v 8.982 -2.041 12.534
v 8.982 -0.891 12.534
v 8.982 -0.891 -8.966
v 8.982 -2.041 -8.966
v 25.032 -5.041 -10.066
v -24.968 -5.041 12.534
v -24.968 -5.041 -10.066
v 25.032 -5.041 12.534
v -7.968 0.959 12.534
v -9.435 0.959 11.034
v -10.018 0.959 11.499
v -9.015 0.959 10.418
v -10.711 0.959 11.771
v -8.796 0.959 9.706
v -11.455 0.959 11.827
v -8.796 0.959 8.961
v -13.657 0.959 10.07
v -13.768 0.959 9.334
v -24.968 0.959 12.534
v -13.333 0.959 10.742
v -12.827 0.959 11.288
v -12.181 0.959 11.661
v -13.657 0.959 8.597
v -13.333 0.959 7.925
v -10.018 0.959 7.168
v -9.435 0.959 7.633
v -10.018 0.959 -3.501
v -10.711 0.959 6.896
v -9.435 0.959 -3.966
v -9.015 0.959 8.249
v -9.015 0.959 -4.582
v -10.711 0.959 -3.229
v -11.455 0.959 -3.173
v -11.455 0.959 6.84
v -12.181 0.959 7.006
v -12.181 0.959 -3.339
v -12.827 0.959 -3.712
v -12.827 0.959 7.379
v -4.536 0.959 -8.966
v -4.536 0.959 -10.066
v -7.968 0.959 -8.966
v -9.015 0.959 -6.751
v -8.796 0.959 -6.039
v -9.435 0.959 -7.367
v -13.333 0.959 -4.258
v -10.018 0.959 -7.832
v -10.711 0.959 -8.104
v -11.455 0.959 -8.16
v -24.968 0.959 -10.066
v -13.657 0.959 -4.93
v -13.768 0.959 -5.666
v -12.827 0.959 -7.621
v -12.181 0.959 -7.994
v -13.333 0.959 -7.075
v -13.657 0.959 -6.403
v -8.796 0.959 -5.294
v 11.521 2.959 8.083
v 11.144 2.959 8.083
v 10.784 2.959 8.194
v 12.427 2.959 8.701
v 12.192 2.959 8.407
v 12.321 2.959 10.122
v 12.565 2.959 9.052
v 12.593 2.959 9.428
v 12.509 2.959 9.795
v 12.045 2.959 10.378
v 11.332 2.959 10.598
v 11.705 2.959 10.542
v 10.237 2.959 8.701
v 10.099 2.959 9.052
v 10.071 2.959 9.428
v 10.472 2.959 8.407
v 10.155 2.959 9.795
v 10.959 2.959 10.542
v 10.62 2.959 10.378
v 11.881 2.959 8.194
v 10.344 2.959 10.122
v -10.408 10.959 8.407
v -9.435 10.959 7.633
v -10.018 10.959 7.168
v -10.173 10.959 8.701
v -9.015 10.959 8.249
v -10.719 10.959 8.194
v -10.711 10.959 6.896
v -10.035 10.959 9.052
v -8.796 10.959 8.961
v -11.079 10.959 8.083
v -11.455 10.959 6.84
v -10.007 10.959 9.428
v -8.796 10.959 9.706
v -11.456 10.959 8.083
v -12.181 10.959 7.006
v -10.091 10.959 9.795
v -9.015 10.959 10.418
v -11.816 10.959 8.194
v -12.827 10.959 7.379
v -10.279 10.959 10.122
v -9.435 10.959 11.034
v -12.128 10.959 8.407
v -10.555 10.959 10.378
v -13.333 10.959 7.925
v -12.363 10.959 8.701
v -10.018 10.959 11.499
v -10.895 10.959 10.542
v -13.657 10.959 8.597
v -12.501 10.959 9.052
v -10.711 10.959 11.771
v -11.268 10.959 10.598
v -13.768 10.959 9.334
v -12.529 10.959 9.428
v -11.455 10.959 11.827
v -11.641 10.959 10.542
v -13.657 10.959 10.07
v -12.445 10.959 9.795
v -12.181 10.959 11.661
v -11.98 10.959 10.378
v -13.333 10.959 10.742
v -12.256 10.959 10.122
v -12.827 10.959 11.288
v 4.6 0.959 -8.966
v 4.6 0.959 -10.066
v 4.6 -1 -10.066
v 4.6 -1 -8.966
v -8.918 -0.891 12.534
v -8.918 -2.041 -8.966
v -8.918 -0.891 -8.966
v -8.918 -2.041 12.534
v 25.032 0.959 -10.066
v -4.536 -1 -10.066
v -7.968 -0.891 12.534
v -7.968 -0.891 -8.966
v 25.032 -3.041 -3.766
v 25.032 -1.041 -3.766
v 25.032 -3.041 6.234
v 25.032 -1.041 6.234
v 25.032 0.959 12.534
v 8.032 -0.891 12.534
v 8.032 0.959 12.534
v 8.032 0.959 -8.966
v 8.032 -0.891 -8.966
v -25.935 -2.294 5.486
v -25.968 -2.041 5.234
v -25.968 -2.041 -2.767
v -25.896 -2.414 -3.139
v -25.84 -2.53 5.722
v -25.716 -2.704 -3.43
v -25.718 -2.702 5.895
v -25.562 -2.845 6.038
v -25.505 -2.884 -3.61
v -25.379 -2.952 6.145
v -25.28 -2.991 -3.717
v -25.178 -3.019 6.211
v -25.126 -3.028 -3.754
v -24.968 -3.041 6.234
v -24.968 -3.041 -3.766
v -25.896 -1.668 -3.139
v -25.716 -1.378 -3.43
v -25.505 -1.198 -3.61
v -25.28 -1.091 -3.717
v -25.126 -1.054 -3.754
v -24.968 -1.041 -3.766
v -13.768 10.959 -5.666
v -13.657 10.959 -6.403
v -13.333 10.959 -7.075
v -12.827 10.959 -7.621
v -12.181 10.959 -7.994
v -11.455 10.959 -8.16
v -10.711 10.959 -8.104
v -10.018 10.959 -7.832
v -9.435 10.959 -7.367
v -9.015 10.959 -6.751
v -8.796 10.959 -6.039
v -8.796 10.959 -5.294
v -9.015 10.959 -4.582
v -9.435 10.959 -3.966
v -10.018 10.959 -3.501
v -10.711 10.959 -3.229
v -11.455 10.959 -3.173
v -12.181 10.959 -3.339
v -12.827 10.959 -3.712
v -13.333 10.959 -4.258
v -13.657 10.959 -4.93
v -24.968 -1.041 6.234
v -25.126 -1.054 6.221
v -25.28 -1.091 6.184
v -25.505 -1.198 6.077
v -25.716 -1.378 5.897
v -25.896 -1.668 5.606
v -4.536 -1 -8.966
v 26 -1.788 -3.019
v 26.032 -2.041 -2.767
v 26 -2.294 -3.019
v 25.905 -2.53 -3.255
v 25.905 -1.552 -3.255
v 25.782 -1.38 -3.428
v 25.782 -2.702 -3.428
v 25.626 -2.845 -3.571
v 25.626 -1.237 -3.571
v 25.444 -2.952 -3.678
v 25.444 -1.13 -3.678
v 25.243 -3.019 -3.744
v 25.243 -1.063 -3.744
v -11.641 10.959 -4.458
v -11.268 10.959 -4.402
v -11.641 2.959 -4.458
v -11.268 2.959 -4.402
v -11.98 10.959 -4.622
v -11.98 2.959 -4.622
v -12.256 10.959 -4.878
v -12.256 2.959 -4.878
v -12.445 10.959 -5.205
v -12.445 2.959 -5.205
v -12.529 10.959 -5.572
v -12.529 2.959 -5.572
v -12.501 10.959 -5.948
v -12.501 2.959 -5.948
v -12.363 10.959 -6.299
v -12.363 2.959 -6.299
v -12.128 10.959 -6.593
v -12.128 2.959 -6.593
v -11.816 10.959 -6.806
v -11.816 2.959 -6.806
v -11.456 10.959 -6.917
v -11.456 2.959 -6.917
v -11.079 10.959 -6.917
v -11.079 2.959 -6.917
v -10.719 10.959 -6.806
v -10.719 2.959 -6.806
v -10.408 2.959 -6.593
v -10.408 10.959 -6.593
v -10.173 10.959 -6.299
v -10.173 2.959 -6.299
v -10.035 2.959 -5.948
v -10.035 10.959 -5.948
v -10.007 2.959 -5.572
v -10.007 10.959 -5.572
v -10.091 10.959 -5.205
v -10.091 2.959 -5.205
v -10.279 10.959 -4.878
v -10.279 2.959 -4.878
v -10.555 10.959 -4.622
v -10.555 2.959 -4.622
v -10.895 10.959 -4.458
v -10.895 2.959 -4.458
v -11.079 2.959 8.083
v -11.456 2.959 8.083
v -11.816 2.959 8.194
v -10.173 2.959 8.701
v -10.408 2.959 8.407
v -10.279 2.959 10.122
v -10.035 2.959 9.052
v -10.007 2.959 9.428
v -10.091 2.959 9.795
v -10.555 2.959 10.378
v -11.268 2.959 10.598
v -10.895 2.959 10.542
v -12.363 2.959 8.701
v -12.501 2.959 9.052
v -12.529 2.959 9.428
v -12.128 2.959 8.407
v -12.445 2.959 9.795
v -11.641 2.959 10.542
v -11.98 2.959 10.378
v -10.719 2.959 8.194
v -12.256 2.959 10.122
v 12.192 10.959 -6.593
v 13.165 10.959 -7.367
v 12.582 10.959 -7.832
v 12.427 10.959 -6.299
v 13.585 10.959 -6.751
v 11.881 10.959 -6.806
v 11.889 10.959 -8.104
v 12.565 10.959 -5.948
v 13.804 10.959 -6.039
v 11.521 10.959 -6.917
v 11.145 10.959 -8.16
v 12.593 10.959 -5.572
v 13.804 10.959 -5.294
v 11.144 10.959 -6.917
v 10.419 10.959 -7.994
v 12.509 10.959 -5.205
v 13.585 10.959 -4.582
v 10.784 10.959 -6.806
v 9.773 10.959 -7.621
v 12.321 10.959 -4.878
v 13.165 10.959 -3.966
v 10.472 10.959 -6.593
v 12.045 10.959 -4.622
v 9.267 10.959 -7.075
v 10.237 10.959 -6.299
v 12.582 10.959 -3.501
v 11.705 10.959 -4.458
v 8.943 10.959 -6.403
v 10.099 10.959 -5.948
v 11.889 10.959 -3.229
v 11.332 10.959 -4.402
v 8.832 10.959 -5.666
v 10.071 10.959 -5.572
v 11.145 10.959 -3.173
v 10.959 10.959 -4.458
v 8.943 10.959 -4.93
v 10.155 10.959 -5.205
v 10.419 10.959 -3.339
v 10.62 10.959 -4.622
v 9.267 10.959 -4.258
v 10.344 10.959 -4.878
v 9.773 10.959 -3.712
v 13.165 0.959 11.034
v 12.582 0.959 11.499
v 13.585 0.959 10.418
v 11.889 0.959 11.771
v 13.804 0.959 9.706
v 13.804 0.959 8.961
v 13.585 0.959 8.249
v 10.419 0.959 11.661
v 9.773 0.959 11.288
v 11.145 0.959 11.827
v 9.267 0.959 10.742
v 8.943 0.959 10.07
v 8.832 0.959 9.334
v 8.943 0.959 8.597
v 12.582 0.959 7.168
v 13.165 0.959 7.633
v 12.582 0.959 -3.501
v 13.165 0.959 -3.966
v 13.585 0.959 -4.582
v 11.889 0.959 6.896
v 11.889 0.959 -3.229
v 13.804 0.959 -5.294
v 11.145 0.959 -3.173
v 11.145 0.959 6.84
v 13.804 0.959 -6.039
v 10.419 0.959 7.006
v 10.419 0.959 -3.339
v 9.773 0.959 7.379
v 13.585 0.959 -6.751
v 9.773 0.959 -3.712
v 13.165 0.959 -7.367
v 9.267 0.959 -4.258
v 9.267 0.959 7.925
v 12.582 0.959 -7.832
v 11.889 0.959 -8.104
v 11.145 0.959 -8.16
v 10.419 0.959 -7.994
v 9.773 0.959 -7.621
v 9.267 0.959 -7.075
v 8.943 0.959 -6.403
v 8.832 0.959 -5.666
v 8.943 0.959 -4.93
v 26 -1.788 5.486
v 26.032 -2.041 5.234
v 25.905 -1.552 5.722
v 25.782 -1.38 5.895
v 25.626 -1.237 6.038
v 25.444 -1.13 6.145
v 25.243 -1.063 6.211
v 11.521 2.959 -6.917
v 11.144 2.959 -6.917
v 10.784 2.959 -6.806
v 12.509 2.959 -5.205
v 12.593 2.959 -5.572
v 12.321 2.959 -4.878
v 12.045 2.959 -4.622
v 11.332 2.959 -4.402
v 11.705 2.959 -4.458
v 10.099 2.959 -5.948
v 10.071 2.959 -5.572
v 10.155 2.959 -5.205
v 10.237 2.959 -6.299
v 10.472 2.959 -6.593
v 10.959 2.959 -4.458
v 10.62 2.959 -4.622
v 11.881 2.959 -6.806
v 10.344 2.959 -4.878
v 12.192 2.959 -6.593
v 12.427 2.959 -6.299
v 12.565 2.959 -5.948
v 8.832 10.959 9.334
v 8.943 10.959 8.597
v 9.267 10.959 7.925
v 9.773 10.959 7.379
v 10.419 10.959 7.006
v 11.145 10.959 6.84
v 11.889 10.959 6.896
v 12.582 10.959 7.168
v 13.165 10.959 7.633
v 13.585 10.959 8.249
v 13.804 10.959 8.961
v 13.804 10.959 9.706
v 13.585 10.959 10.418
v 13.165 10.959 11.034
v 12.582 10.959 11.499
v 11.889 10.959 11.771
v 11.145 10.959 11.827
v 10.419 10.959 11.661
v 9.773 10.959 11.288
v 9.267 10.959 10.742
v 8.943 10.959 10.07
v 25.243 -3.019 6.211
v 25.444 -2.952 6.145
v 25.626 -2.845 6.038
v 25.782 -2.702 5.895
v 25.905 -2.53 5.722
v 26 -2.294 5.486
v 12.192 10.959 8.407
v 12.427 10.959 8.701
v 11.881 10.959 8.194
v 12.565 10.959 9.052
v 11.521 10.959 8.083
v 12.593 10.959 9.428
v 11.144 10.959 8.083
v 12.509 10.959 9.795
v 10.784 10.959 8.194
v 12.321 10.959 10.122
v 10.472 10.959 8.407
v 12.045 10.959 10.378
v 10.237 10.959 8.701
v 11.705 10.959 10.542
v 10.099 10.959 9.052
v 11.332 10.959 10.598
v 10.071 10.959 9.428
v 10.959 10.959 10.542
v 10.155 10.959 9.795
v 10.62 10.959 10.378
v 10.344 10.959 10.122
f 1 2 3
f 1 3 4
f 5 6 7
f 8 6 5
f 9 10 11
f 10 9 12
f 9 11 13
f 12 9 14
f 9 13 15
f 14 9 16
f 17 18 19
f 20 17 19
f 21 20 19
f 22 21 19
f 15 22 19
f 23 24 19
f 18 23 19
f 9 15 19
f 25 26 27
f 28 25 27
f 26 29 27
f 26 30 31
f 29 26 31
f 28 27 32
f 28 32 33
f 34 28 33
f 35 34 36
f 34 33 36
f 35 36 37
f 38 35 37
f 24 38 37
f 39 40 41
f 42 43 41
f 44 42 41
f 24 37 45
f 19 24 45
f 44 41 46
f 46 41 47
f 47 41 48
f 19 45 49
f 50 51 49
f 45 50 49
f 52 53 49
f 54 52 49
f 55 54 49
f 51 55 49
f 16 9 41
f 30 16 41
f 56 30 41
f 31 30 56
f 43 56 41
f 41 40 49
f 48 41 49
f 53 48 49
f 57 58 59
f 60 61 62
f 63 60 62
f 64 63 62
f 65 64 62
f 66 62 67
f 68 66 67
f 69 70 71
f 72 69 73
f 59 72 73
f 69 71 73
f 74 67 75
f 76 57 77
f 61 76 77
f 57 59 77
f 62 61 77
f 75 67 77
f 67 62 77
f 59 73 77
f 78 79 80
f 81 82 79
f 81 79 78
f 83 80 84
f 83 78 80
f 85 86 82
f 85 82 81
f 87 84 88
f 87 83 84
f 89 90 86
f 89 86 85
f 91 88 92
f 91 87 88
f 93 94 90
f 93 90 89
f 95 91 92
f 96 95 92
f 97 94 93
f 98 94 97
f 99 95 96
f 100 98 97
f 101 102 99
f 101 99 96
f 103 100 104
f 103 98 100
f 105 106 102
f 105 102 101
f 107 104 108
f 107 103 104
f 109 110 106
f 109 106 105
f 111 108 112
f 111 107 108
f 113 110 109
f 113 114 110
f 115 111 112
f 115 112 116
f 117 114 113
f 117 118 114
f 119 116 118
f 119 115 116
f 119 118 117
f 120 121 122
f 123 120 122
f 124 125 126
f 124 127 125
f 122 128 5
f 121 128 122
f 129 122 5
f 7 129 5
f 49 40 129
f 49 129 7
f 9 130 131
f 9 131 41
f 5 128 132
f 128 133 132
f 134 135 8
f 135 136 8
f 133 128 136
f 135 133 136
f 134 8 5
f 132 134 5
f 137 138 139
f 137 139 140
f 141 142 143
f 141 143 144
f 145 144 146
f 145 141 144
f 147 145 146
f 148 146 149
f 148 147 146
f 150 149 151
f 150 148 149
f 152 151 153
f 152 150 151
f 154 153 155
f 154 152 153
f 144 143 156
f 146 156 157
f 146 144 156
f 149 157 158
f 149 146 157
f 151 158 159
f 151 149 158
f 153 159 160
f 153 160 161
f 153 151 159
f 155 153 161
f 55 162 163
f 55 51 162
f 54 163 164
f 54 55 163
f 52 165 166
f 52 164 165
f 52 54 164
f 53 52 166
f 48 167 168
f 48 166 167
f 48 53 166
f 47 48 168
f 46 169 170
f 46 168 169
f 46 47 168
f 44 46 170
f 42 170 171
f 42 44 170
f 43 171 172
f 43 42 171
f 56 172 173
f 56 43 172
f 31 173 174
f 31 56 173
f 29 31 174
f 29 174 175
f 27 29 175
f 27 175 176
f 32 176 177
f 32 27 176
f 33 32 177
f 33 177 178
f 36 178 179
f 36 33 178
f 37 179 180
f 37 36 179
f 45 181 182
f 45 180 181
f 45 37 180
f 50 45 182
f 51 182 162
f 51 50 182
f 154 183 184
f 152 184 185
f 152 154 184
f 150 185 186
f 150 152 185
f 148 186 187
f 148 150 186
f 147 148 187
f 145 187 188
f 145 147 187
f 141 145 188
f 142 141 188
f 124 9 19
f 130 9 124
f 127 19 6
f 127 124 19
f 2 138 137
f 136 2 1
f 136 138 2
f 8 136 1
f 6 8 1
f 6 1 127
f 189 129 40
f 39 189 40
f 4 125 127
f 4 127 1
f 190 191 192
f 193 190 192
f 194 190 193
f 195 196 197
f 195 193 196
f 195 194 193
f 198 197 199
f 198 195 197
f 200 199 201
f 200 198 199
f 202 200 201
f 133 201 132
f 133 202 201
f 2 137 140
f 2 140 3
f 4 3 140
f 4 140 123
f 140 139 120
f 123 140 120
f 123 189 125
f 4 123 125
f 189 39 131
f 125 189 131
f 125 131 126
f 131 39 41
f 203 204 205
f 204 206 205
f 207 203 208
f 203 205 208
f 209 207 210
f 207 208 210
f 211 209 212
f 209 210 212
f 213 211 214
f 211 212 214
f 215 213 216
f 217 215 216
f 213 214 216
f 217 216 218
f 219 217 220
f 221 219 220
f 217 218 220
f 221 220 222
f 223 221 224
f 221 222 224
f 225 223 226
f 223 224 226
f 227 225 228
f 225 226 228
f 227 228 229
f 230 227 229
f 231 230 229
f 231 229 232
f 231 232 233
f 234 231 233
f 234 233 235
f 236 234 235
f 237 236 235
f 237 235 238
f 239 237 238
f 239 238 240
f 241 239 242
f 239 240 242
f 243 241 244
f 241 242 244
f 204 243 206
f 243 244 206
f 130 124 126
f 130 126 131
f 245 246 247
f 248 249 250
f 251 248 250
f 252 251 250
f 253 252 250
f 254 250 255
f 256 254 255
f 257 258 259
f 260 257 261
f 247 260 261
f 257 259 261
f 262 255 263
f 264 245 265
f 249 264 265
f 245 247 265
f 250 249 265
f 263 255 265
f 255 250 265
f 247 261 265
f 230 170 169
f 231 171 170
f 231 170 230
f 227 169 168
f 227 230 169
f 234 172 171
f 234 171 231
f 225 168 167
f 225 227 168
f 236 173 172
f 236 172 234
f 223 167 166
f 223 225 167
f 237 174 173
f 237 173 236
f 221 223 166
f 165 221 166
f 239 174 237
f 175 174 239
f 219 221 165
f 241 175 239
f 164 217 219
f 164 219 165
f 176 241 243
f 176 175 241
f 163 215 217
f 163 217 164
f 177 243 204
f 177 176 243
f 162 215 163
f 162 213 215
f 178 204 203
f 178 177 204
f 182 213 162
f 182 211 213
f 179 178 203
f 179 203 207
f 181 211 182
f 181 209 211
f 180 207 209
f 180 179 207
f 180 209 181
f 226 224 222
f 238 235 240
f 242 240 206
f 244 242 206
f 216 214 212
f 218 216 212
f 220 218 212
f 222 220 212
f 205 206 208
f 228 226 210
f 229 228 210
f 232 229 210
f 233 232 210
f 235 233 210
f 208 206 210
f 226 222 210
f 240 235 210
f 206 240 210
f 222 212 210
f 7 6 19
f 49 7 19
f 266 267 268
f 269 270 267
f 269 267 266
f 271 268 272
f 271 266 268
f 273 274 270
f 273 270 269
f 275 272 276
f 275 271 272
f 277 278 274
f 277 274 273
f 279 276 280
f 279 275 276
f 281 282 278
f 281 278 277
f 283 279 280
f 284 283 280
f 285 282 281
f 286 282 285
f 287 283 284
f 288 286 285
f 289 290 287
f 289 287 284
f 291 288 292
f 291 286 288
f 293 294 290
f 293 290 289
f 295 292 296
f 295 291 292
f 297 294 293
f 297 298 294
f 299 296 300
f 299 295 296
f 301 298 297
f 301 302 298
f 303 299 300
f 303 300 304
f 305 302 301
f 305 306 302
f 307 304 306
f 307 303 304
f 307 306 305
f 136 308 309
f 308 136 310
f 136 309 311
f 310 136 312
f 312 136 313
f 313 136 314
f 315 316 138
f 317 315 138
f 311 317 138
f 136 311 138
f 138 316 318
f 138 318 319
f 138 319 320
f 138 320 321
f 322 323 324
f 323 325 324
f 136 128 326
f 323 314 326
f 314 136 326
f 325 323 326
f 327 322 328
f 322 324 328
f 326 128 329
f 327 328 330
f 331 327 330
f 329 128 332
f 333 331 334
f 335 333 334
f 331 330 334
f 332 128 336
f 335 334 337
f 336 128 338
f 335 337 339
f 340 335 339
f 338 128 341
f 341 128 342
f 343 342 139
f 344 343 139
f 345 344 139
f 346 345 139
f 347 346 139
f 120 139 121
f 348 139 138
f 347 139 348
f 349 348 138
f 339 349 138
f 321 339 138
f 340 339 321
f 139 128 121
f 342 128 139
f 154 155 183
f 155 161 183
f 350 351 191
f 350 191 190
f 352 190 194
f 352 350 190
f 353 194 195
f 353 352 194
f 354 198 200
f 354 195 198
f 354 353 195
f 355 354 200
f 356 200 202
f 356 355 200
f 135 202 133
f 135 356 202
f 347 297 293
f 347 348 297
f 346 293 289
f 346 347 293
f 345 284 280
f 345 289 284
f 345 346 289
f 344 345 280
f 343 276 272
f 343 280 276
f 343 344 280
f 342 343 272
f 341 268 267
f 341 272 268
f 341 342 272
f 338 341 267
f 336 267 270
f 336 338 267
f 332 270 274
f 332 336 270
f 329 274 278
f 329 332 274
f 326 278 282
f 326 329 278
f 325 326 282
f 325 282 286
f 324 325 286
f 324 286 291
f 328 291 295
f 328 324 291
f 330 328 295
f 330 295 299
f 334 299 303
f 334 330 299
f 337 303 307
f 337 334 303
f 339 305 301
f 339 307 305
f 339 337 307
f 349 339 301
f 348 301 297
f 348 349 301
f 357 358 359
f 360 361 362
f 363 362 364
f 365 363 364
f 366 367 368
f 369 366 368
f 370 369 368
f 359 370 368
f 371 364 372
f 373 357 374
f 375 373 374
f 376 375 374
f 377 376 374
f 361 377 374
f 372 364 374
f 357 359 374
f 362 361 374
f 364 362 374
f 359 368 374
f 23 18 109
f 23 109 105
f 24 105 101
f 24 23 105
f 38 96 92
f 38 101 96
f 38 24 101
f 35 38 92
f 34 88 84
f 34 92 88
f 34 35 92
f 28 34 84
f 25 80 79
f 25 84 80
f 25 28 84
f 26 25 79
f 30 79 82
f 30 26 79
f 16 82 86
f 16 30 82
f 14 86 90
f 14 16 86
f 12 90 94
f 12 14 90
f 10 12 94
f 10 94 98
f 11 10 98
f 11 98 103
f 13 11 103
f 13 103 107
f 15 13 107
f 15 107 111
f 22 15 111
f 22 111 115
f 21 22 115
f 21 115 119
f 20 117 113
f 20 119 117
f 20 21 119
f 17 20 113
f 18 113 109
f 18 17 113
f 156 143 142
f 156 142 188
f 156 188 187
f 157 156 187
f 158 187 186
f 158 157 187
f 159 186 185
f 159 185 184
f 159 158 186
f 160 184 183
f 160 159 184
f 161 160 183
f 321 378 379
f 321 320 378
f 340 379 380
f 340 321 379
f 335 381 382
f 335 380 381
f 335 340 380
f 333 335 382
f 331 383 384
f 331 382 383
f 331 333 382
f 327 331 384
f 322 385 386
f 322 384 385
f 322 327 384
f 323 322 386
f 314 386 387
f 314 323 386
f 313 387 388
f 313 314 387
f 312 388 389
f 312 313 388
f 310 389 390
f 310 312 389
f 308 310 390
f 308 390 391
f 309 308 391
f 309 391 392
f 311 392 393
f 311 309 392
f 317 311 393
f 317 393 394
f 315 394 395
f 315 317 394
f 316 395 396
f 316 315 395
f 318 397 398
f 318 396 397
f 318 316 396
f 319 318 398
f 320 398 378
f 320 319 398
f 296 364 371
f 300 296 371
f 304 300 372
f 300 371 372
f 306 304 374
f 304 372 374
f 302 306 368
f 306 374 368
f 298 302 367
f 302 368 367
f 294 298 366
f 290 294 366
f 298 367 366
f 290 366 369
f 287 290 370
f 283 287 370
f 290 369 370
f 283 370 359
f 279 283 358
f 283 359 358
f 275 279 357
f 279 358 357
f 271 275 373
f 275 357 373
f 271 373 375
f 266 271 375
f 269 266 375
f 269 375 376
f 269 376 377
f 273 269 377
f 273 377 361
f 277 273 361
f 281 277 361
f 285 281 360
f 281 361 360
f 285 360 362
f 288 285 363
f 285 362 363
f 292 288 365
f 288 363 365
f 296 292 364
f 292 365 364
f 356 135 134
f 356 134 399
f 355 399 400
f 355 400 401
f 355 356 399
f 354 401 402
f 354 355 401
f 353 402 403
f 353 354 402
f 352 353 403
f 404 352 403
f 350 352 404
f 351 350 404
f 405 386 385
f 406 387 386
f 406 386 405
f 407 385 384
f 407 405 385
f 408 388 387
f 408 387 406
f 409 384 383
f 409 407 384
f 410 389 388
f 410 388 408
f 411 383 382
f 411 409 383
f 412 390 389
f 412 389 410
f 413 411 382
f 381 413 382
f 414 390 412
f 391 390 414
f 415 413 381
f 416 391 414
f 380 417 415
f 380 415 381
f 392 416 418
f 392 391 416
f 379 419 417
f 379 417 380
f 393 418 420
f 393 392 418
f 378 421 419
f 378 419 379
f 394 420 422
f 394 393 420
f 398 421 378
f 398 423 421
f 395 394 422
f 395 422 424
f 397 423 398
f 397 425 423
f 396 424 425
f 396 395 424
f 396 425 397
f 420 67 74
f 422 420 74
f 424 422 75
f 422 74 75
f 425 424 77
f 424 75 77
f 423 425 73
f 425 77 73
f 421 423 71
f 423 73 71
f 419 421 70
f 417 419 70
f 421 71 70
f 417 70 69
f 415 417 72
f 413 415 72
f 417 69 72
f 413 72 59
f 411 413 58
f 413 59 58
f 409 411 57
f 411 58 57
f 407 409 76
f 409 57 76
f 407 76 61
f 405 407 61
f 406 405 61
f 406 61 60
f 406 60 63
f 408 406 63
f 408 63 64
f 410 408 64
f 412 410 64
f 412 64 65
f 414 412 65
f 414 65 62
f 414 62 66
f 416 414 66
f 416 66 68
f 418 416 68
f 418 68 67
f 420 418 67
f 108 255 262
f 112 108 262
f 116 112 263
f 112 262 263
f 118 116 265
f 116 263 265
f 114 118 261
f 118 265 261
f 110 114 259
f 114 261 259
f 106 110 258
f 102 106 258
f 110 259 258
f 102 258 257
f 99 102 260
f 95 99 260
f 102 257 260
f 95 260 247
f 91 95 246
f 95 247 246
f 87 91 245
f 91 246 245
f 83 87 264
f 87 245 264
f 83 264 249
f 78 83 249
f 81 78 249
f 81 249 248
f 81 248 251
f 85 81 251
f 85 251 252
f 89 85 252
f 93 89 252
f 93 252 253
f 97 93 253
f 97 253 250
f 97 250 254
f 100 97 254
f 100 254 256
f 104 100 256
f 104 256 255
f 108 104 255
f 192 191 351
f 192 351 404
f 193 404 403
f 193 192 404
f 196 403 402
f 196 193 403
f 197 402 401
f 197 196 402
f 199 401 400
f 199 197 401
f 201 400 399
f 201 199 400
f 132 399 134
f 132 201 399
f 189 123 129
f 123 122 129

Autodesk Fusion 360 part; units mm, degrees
sketch "Sketch6" plane through (0, -2.041, 0) normal (0, -1, 0) x (1, 0, 0)
  arc A0 (-8.8678, -6.7665) -> (-6.8678, -8.7665) centre (-6.8678, -6.7665) ccw
  line L0 (-6.8678, -8.7665) -> (6.9322, -8.7665)
  arc A1 (6.9322, -8.7665) -> (8.9322, -6.7665) centre (6.9322, -6.7665) ccw
  line L1 (8.9322, -6.7665) -> (8.9322, -6.6865)
  line L2 (8.9322, -6.6865) -> (7.6522, -6.6865)
  arc A2 (7.6522, -4.8865) -> (7.6522, -6.6865) centre (7.6522, -5.7865) ccw
  line L3 (7.6522, -4.8865) -> (8.9322, -4.8865)
  line L4 (8.9322, -4.8865) -> (8.9322, -4.1465)
  line L5 (8.9322, -4.1465) -> (7.6522, -4.1465)
  arc A3 (7.6522, -2.3465) -> (7.6522, -4.1465) centre (7.6522, -3.2465) ccw
  line L6 (7.6522, -2.3465) -> (8.9322, -2.3465)
  line L7 (8.9322, -2.3465) -> (8.9322, -1.6065)
  line L8 (8.9322, -1.6065) -> (7.6522, -1.6065)
  arc A4 (7.6522, 0.1935) -> (7.6522, -1.6065) centre (7.6522, -0.7065) ccw
  line L9 (7.6522, 0.1935) -> (8.9322, 0.1935)
  line L10 (8.9322, 0.1935) -> (8.9322, 0.9335)
  line L11 (8.9322, 0.9335) -> (7.6522, 0.9335)
  arc A5 (7.6522, 2.7335) -> (7.6522, 0.9335) centre (7.6522, 1.8335) ccw
  line L12 (7.6522, 2.7335) -> (8.9322, 2.7335)
  line L13 (8.9322, 2.7335) -> (8.9322, 3.4735)
  line L14 (8.9322, 3.4735) -> (7.6522, 3.4735)
  arc A6 (7.6522, 5.2735) -> (7.6522, 3.4735) centre (7.6522, 4.3735) ccw
  line L15 (7.6522, 5.2735) -> (8.9322, 5.2735)
  line L16 (8.9322, 5.2735) -> (8.9322, 6.0135)
  line L17 (8.9322, 6.0135) -> (7.6522, 6.0135)
  arc A7 (7.6522, 7.8135) -> (7.6522, 6.0135) centre (7.6522, 6.9135) ccw
  line L18 (7.6522, 7.8135) -> (8.9322, 7.8135)
  line L19 (8.9322, 7.8135) -> (8.9322, 8.5535)
  line L20 (8.9322, 8.5535) -> (7.6522, 8.5535)
  arc A8 (7.6522, 10.3535) -> (7.6522, 8.5535) centre (7.6522, 9.4535) ccw
  line L21 (7.6522, 10.3535) -> (8.9322, 10.3535)
  line L22 (8.9322, 10.3535) -> (8.9322, 10.4335)
  arc A9 (8.9322, 10.4335) -> (6.9322, 12.4335) centre (6.9322, 10.4335) ccw
  line L23 (6.9322, 12.4335) -> (-6.8678, 12.4335)
  arc A10 (-6.8678, 12.4335) -> (-8.8678, 10.4335) centre (-6.8678, 10.4335) ccw
  line L24 (-8.8678, 10.4335) -> (-8.8678, 10.3535)
  line L25 (-8.8678, 10.3535) -> (-7.5878, 10.3535)
  arc A11 (-7.5878, 8.5535) -> (-7.5878, 10.3535) centre (-7.5878, 9.4535) ccw
  line L26 (-7.5878, 8.5535) -> (-8.8678, 8.5535)
  line L27 (-8.8678, 8.5535) -> (-8.8678, 7.8135)
  line L28 (-8.8678, 7.8135) -> (-7.5878, 7.8135)
  arc A12 (-7.5878, 6.0135) -> (-7.5878, 7.8135) centre (-7.5878, 6.9135) ccw
  line L29 (-7.5878, 6.0135) -> (-8.8678, 6.0135)
  line L30 (-8.8678, 6.0135) -> (-8.8678, 5.2735)
  line L31 (-8.8678, 5.2735) -> (-7.5878, 5.2735)
  arc A13 (-7.5878, 3.4735) -> (-7.5878, 5.2735) centre (-7.5878, 4.3735) ccw
  line L32 (-7.5878, 3.4735) -> (-8.8678, 3.4735)
  line L33 (-8.8678, 3.4735) -> (-8.8678, 2.7335)
  line L34 (-8.8678, 2.7335) -> (-7.5878, 2.7335)
  arc A14 (-7.5878, 0.9335) -> (-7.5878, 2.7335) centre (-7.5878, 1.8335) ccw
  line L35 (-7.5878, 0.9335) -> (-8.8678, 0.9335)
  line L36 (-8.8678, 0.9335) -> (-8.8678, 0.1935)
  line L37 (-8.8678, 0.1935) -> (-7.5878, 0.1935)
  arc A15 (-7.5878, -1.6065) -> (-7.5878, 0.1935) centre (-7.5878, -0.7065) ccw
  line L38 (-7.5878, -1.6065) -> (-8.8678, -1.6065)
  line L39 (-8.8678, -1.6065) -> (-8.8678, -2.3465)
  line L40 (-8.8678, -2.3465) -> (-7.5878, -2.3465)
  arc A16 (-7.5878, -4.1465) -> (-7.5878, -2.3465) centre (-7.5878, -3.2465) ccw
  line L41 (-7.5878, -4.1465) -> (-8.8678, -4.1465)
  line L42 (-8.8678, -4.1465) -> (-8.8678, -4.8865)
  line L43 (-8.8678, -4.8865) -> (-7.5878, -4.8865)
  arc A17 (-7.5878, -6.6865) -> (-7.5878, -4.8865) centre (-7.5878, -5.7865) ccw
  line L44 (-7.5878, -6.6865) -> (-8.8678, -6.6865)
  line L45 (-8.8678, -6.6865) -> (-8.8678, -6.7665)
  line L46 (0.0322, -8.7665) -> (0.0322, 12.4335)
  line L47 (25.0322, 12.5335) -> (-24.9678, 12.5335)
  line L48 (-24.9678, 12.5335) -> (-24.9678, -8.8665)
  line L49 (-24.9678, -8.8665) -> (25.0322, -8.8665)
  line L50 (25.0322, -8.8665) -> (25.0322, 12.5335)
  line L51 (25.0322, 12.5335) -> (-24.9678, -8.8665) construction
  line L52 (-24.9678, 12.5335) -> (25.0322, -8.8665) construction
  point P0 (0.0322, 1.8335)
  point P1 (0.0322, 1.8335)
  dimension "d1" = 50
  dimension "d2" = 21.4
extrude "Extrude1" add sketch "Sketch6" along normal blind 3 contours A0 L0 L23 A10 L24 L25 A11 L26 L27 L28 A12 L29 L30 L31 A13 L32 L33 L34 A14 L35 L36 L37 A15 L38 L39 L40 A16 L41 L42 L43 A17 L44 L45 L46 | L0 A1 L1 L2 A2 L3 L4 L5 A3 L6 L7 L8 A4 L9 L10 L11 A5 L12 L13 L14 A6 L15 L16 L17 A7 L18 L19 L20 A8 L21 L22 A9 L23 L46 | L47 L48 L49 L50 makes body 1
sketch "Sketch7" plane through (0, 0, 12.5335) normal (0, 0, 1) x (1, 0, 0)
  line L0 (25.0322, -2.041) -> (-24.9678, -2.041)
  line L1 (-24.9678, -2.041) -> (-24.9678, -5.041)
  line L2 (-24.9678, -5.041) -> (25.0322, -5.041)
  line L3 (25.0322, -5.041) -> (25.0322, -2.041)
  line L4 (-8.8678, -2.041) -> (8.9323, -2.041)
  line L5 (15.0322, -2.041) -> (15.0322, 0.959)
  line L6 (-14.9678, 0.959) -> (-14.9678, -2.041)
  line L7 (8.9822, -0.891) -> (8.9822, -2.041)
  line L8 (-8.9178, -2.041) -> (-8.9178, -0.891)
  line L9 (15.0322, 0.959) -> (8.0322, 0.959)
  line L10 (-7.9678, 0.959) -> (-14.9678, 0.959)
  line L11 (-8.9178, -0.891) -> (-7.9678, -0.891)
  line L12 (8.0322, -0.891) -> (8.9822, -0.891)
  line L13 (-7.9678, -1.0131) -> (-7.9678, 0.959)
  line L14 (8.0322, 0.959) -> (8.0322, -0.891)
  line L15 (-14.9678, -2.041) -> (15.0322, -2.041)
  point P0 (0.0322, -2.041)
  point P1 (0.0322, -2.041)
  point P2 (0.0322, -2.041)
  dimension "d5" = 17.8001
  dimension "d6" = 30
extrude "Extrude2" add sketch "Sketch7" against normal blind 21.4 contours L0 L5 L7 L9 L12 L14 L15 | L0 L6 L8 L10 L11 L13 L15 bodies 1
extrude "Extrude3" add 1 faces at (15.0322, -1.041, 5.4001) along direction (1, 0, 0) blind 10 on bodies 1 bodies 1
extrude "Extrude4" add 1 faces at (-14.9678, -0.041, 5.4001) along direction (-1, 0, 0) blind 10 on bodies 1 bodies 1
sketch "Sketch8" plane through (0, 0.959, 0) normal (0, 1, 0) x (-1, 0, 0)
  line L0 (-8.0322, 12.5335) -> (-25.0322, 12.5335)
  line L1 (-25.0322, 12.5335) -> (-25.0322, -8.8665)
  line L2 (-25.0322, -8.8665) -> (-8.0322, -8.8665)
  line L3 (-8.0322, -8.8665) -> (-8.0322, 12.5335)
  line L4 (24.9678, 12.5335) -> (24.9678, -8.8665)
  line L5 (-25.0322, 1.8335) -> (24.9678, 1.8335)
  line L6 (-11.3322, 9.3335) -> (11.2678, -5.6665) construction
  line L7 (11.2678, 9.3335) -> (-11.3322, -5.6665) construction
  circle A0 centre (11.2678, -5.6665) radius 2.5
  circle A1 centre (-11.3322, -5.6665) radius 2.5
  circle A2 centre (11.2678, 9.3335) radius 2.5
  circle A3 centre (-11.3322, 9.3335) radius 2.5
  point P0 (30, -14)
  point P1 (24.9678, 1.8335)
  point P2 (-25.0322, 1.8335)
  point P3 (-0.0322, 1.8335)
  point P4 (-0.0322, 1.8335)
  dimension "d17" = 22.6
  dimension "d18" = 15
  dimension "d19" = 5
  dimension "d22" = -22.6
  dimension "d23" = 15
extrude "Extrude5" add sketch "Sketch8" along normal blind 10 contours A0 | A1 | A2 | A3 bodies 1
sketch "Sketch9" plane through (0, 10.959, 0) normal (0, 1, 0) x (-1, 0, 0)
  circle A0 centre (11.2678, -5.6665) radius 2.5
  circle A1 centre (11.2678, -5.6665) radius 2.5
  point P0 (-11.3322, -5.6665)
  point P1 (11.2678, 9.3335)
  point P2 (-11.3322, 9.3335)
  dimension "d28" = -22.6
  dimension "d29" = 15
hole "Hole1" at (-11.2678, 10.959, -5.6665) at (-11.2678, 10.959, 9.3335) at (11.3322, 10.959, 9.3335) at (11.3322, 10.959, -5.6665) direction (0, -1, 0) diameter 2.529 depth 8 tip angle 180 bodies 1
extrude "Extrude6" add 1 faces at (3.0155, -4.041, -8.8665) along direction (0, 0, -1) blind 1.2 on bodies 1 bodies 1
sketch "Sketch10" plane through (0, 0, -10.0665) normal (0, 0, -1) x (-1, 0, 0)
  line L0 (24.9678, -2.041) -> (24.9678, -2.041)
  line L1 (24.9678, -2.041) -> (24.9678, 0.959)
  line L2 (24.9678, 0.959) -> (7.9678, 0.959)
  line L3 (7.9678, 0.959) -> (7.9678, -0.891)
  line L4 (7.9678, -0.891) -> (8.9178, -0.891)
  line L5 (8.9178, -0.891) -> (8.9178, -2.041)
  line L6 (8.9178, -2.041) -> (-8.9822, -2.041)
  line L7 (-8.9822, -2.041) -> (-8.9822, -0.891)
  line L8 (-8.9822, -0.891) -> (-8.0322, -0.891)
  line L9 (-8.0322, -0.891) -> (-8.0322, 0.959)
  line L10 (-8.0322, 0.959) -> (-25.0322, 0.959)
  line L11 (-25.0322, 0.959) -> (-25.0322, -2.041)
  line L12 (-25.0322, -2.041) -> (-25.0322, -2.041)
  line L13 (-25.0322, -2.041) -> (-25.0322, -5.041)
  line L14 (-25.0322, -5.041) -> (24.9678, -5.041)
  line L15 (24.9678, -5.041) -> (24.9678, -2.041)
  line L16 (7.9678, -0.891) -> (8.9178, -0.891)
  line L17 (8.9178, -2.041) -> (-8.9822, -2.041)
  line L18 (-8.9822, -0.891) -> (-8.0322, -0.891)
  line L19 (-4.6, -1) -> (4.5356, -1)
  line L20 (4.5356, -1) -> (4.5356, 0.959)
  line L21 (-4.6, 0.959) -> (-4.6, -1)
  line L22 (-8.0322, 0.959) -> (-4.6, 0.959)
  line L23 (4.5356, 0.959) -> (7.9678, 0.959)
extrude "Extrude7" add sketch "Sketch10" against normal blind 1.1 contours L3 L4 L5 L6 L7 L8 L9 L16 L17 L18 L19 L20 L21 L22 L23 bodies 1
sketch "Sketch11" plane through (25.0322, 0, 0) normal (1, 0, 0) x (0, 0, -1)
  line L0 (-12.5335, 0.959) -> (-12.5335, -2.041)
  line L1 (-12.5335, -2.041) -> (10.0665, -2.041)
  line L2 (10.0665, -2.041) -> (10.0665, 0.959)
  line L3 (10.0665, 0.959) -> (-12.5335, 0.959)
  line L4 (-12.5335, -2.041) -> (10.0665, -2.041)
  line L5 (3.7665, -1.041) -> (-6.2335, -1.041)
  line L6 (-6.2335, -1.041) -> (-6.2335, -3.041)
  line L7 (-6.2335, -3.041) -> (3.7665, -3.041)
  line L8 (3.7665, -3.041) -> (3.7665, -1.041)
  line L9 (3.7665, -1.041) -> (-6.2335, -3.041) construction
  line L10 (-6.2335, -1.041) -> (3.7665, -3.041) construction
  point P0 (-1.2335, -2.041)
  point P1 (-1.2335, -2.041)
  dimension "d43" = 10
  dimension "d44" = 2
extrude "Extrude8" add sketch "Sketch11" along normal blind 1 contours L1 L4 L5 L6 L8 | L1 L4 L6 L7 L8 bodies 1
fillet "Fillet1" radius 1 4 edges at (26.0322, -1.041, 1.2335) (26.0322, -3.041, 1.2335) (26.0322, -2.041, 6.2335) (26.0322, -2.041, -3.7665) on bodies 1
sketch "Sketch12" plane through (-24.9678, 0, 0) normal (-1, 0, 0) x (0, 0, 1)
  line L0 (12.5335, -2.041) -> (12.5335, 0.959)
  line L1 (12.5335, 0.959) -> (-10.0665, 0.959)
  line L2 (-10.0665, 0.959) -> (-10.0665, -2.041)
  line L3 (-10.0665, -2.041) -> (12.5335, -2.041)
  line L4 (-10.0665, -2.041) -> (12.5335, -2.041)
  line L5 (-3.7665, -3.041) -> (6.2335, -3.041)
  line L6 (6.2335, -3.041) -> (6.2335, -1.041)
  line L7 (6.2335, -1.041) -> (-3.7665, -1.041)
  line L8 (-3.7665, -1.041) -> (-3.7665, -3.041)
  line L9 (-3.7665, -3.041) -> (6.2335, -1.041) construction
  line L10 (6.2335, -3.041) -> (-3.7665, -1.041) construction
  point P0 (1.2335, -2.041)
  point P1 (1.2335, -2.041)
  dimension "d49" = 10
  dimension "d50" = 2
extrude "Extrude9" add sketch "Sketch12" along normal blind 1 separate body contours L3 L4 L5 L6 L8 | L3 L4 L6 L7 L8 makes body 2
fillet "Fillet2" radius 1 4 edges at (-25.9678, -2.041, -3.7665) (-25.9678, -1.041, 1.2335) (-25.9678, -3.041, 1.2335) (-25.9678, -2.041, 6.2335) on bodies 2
